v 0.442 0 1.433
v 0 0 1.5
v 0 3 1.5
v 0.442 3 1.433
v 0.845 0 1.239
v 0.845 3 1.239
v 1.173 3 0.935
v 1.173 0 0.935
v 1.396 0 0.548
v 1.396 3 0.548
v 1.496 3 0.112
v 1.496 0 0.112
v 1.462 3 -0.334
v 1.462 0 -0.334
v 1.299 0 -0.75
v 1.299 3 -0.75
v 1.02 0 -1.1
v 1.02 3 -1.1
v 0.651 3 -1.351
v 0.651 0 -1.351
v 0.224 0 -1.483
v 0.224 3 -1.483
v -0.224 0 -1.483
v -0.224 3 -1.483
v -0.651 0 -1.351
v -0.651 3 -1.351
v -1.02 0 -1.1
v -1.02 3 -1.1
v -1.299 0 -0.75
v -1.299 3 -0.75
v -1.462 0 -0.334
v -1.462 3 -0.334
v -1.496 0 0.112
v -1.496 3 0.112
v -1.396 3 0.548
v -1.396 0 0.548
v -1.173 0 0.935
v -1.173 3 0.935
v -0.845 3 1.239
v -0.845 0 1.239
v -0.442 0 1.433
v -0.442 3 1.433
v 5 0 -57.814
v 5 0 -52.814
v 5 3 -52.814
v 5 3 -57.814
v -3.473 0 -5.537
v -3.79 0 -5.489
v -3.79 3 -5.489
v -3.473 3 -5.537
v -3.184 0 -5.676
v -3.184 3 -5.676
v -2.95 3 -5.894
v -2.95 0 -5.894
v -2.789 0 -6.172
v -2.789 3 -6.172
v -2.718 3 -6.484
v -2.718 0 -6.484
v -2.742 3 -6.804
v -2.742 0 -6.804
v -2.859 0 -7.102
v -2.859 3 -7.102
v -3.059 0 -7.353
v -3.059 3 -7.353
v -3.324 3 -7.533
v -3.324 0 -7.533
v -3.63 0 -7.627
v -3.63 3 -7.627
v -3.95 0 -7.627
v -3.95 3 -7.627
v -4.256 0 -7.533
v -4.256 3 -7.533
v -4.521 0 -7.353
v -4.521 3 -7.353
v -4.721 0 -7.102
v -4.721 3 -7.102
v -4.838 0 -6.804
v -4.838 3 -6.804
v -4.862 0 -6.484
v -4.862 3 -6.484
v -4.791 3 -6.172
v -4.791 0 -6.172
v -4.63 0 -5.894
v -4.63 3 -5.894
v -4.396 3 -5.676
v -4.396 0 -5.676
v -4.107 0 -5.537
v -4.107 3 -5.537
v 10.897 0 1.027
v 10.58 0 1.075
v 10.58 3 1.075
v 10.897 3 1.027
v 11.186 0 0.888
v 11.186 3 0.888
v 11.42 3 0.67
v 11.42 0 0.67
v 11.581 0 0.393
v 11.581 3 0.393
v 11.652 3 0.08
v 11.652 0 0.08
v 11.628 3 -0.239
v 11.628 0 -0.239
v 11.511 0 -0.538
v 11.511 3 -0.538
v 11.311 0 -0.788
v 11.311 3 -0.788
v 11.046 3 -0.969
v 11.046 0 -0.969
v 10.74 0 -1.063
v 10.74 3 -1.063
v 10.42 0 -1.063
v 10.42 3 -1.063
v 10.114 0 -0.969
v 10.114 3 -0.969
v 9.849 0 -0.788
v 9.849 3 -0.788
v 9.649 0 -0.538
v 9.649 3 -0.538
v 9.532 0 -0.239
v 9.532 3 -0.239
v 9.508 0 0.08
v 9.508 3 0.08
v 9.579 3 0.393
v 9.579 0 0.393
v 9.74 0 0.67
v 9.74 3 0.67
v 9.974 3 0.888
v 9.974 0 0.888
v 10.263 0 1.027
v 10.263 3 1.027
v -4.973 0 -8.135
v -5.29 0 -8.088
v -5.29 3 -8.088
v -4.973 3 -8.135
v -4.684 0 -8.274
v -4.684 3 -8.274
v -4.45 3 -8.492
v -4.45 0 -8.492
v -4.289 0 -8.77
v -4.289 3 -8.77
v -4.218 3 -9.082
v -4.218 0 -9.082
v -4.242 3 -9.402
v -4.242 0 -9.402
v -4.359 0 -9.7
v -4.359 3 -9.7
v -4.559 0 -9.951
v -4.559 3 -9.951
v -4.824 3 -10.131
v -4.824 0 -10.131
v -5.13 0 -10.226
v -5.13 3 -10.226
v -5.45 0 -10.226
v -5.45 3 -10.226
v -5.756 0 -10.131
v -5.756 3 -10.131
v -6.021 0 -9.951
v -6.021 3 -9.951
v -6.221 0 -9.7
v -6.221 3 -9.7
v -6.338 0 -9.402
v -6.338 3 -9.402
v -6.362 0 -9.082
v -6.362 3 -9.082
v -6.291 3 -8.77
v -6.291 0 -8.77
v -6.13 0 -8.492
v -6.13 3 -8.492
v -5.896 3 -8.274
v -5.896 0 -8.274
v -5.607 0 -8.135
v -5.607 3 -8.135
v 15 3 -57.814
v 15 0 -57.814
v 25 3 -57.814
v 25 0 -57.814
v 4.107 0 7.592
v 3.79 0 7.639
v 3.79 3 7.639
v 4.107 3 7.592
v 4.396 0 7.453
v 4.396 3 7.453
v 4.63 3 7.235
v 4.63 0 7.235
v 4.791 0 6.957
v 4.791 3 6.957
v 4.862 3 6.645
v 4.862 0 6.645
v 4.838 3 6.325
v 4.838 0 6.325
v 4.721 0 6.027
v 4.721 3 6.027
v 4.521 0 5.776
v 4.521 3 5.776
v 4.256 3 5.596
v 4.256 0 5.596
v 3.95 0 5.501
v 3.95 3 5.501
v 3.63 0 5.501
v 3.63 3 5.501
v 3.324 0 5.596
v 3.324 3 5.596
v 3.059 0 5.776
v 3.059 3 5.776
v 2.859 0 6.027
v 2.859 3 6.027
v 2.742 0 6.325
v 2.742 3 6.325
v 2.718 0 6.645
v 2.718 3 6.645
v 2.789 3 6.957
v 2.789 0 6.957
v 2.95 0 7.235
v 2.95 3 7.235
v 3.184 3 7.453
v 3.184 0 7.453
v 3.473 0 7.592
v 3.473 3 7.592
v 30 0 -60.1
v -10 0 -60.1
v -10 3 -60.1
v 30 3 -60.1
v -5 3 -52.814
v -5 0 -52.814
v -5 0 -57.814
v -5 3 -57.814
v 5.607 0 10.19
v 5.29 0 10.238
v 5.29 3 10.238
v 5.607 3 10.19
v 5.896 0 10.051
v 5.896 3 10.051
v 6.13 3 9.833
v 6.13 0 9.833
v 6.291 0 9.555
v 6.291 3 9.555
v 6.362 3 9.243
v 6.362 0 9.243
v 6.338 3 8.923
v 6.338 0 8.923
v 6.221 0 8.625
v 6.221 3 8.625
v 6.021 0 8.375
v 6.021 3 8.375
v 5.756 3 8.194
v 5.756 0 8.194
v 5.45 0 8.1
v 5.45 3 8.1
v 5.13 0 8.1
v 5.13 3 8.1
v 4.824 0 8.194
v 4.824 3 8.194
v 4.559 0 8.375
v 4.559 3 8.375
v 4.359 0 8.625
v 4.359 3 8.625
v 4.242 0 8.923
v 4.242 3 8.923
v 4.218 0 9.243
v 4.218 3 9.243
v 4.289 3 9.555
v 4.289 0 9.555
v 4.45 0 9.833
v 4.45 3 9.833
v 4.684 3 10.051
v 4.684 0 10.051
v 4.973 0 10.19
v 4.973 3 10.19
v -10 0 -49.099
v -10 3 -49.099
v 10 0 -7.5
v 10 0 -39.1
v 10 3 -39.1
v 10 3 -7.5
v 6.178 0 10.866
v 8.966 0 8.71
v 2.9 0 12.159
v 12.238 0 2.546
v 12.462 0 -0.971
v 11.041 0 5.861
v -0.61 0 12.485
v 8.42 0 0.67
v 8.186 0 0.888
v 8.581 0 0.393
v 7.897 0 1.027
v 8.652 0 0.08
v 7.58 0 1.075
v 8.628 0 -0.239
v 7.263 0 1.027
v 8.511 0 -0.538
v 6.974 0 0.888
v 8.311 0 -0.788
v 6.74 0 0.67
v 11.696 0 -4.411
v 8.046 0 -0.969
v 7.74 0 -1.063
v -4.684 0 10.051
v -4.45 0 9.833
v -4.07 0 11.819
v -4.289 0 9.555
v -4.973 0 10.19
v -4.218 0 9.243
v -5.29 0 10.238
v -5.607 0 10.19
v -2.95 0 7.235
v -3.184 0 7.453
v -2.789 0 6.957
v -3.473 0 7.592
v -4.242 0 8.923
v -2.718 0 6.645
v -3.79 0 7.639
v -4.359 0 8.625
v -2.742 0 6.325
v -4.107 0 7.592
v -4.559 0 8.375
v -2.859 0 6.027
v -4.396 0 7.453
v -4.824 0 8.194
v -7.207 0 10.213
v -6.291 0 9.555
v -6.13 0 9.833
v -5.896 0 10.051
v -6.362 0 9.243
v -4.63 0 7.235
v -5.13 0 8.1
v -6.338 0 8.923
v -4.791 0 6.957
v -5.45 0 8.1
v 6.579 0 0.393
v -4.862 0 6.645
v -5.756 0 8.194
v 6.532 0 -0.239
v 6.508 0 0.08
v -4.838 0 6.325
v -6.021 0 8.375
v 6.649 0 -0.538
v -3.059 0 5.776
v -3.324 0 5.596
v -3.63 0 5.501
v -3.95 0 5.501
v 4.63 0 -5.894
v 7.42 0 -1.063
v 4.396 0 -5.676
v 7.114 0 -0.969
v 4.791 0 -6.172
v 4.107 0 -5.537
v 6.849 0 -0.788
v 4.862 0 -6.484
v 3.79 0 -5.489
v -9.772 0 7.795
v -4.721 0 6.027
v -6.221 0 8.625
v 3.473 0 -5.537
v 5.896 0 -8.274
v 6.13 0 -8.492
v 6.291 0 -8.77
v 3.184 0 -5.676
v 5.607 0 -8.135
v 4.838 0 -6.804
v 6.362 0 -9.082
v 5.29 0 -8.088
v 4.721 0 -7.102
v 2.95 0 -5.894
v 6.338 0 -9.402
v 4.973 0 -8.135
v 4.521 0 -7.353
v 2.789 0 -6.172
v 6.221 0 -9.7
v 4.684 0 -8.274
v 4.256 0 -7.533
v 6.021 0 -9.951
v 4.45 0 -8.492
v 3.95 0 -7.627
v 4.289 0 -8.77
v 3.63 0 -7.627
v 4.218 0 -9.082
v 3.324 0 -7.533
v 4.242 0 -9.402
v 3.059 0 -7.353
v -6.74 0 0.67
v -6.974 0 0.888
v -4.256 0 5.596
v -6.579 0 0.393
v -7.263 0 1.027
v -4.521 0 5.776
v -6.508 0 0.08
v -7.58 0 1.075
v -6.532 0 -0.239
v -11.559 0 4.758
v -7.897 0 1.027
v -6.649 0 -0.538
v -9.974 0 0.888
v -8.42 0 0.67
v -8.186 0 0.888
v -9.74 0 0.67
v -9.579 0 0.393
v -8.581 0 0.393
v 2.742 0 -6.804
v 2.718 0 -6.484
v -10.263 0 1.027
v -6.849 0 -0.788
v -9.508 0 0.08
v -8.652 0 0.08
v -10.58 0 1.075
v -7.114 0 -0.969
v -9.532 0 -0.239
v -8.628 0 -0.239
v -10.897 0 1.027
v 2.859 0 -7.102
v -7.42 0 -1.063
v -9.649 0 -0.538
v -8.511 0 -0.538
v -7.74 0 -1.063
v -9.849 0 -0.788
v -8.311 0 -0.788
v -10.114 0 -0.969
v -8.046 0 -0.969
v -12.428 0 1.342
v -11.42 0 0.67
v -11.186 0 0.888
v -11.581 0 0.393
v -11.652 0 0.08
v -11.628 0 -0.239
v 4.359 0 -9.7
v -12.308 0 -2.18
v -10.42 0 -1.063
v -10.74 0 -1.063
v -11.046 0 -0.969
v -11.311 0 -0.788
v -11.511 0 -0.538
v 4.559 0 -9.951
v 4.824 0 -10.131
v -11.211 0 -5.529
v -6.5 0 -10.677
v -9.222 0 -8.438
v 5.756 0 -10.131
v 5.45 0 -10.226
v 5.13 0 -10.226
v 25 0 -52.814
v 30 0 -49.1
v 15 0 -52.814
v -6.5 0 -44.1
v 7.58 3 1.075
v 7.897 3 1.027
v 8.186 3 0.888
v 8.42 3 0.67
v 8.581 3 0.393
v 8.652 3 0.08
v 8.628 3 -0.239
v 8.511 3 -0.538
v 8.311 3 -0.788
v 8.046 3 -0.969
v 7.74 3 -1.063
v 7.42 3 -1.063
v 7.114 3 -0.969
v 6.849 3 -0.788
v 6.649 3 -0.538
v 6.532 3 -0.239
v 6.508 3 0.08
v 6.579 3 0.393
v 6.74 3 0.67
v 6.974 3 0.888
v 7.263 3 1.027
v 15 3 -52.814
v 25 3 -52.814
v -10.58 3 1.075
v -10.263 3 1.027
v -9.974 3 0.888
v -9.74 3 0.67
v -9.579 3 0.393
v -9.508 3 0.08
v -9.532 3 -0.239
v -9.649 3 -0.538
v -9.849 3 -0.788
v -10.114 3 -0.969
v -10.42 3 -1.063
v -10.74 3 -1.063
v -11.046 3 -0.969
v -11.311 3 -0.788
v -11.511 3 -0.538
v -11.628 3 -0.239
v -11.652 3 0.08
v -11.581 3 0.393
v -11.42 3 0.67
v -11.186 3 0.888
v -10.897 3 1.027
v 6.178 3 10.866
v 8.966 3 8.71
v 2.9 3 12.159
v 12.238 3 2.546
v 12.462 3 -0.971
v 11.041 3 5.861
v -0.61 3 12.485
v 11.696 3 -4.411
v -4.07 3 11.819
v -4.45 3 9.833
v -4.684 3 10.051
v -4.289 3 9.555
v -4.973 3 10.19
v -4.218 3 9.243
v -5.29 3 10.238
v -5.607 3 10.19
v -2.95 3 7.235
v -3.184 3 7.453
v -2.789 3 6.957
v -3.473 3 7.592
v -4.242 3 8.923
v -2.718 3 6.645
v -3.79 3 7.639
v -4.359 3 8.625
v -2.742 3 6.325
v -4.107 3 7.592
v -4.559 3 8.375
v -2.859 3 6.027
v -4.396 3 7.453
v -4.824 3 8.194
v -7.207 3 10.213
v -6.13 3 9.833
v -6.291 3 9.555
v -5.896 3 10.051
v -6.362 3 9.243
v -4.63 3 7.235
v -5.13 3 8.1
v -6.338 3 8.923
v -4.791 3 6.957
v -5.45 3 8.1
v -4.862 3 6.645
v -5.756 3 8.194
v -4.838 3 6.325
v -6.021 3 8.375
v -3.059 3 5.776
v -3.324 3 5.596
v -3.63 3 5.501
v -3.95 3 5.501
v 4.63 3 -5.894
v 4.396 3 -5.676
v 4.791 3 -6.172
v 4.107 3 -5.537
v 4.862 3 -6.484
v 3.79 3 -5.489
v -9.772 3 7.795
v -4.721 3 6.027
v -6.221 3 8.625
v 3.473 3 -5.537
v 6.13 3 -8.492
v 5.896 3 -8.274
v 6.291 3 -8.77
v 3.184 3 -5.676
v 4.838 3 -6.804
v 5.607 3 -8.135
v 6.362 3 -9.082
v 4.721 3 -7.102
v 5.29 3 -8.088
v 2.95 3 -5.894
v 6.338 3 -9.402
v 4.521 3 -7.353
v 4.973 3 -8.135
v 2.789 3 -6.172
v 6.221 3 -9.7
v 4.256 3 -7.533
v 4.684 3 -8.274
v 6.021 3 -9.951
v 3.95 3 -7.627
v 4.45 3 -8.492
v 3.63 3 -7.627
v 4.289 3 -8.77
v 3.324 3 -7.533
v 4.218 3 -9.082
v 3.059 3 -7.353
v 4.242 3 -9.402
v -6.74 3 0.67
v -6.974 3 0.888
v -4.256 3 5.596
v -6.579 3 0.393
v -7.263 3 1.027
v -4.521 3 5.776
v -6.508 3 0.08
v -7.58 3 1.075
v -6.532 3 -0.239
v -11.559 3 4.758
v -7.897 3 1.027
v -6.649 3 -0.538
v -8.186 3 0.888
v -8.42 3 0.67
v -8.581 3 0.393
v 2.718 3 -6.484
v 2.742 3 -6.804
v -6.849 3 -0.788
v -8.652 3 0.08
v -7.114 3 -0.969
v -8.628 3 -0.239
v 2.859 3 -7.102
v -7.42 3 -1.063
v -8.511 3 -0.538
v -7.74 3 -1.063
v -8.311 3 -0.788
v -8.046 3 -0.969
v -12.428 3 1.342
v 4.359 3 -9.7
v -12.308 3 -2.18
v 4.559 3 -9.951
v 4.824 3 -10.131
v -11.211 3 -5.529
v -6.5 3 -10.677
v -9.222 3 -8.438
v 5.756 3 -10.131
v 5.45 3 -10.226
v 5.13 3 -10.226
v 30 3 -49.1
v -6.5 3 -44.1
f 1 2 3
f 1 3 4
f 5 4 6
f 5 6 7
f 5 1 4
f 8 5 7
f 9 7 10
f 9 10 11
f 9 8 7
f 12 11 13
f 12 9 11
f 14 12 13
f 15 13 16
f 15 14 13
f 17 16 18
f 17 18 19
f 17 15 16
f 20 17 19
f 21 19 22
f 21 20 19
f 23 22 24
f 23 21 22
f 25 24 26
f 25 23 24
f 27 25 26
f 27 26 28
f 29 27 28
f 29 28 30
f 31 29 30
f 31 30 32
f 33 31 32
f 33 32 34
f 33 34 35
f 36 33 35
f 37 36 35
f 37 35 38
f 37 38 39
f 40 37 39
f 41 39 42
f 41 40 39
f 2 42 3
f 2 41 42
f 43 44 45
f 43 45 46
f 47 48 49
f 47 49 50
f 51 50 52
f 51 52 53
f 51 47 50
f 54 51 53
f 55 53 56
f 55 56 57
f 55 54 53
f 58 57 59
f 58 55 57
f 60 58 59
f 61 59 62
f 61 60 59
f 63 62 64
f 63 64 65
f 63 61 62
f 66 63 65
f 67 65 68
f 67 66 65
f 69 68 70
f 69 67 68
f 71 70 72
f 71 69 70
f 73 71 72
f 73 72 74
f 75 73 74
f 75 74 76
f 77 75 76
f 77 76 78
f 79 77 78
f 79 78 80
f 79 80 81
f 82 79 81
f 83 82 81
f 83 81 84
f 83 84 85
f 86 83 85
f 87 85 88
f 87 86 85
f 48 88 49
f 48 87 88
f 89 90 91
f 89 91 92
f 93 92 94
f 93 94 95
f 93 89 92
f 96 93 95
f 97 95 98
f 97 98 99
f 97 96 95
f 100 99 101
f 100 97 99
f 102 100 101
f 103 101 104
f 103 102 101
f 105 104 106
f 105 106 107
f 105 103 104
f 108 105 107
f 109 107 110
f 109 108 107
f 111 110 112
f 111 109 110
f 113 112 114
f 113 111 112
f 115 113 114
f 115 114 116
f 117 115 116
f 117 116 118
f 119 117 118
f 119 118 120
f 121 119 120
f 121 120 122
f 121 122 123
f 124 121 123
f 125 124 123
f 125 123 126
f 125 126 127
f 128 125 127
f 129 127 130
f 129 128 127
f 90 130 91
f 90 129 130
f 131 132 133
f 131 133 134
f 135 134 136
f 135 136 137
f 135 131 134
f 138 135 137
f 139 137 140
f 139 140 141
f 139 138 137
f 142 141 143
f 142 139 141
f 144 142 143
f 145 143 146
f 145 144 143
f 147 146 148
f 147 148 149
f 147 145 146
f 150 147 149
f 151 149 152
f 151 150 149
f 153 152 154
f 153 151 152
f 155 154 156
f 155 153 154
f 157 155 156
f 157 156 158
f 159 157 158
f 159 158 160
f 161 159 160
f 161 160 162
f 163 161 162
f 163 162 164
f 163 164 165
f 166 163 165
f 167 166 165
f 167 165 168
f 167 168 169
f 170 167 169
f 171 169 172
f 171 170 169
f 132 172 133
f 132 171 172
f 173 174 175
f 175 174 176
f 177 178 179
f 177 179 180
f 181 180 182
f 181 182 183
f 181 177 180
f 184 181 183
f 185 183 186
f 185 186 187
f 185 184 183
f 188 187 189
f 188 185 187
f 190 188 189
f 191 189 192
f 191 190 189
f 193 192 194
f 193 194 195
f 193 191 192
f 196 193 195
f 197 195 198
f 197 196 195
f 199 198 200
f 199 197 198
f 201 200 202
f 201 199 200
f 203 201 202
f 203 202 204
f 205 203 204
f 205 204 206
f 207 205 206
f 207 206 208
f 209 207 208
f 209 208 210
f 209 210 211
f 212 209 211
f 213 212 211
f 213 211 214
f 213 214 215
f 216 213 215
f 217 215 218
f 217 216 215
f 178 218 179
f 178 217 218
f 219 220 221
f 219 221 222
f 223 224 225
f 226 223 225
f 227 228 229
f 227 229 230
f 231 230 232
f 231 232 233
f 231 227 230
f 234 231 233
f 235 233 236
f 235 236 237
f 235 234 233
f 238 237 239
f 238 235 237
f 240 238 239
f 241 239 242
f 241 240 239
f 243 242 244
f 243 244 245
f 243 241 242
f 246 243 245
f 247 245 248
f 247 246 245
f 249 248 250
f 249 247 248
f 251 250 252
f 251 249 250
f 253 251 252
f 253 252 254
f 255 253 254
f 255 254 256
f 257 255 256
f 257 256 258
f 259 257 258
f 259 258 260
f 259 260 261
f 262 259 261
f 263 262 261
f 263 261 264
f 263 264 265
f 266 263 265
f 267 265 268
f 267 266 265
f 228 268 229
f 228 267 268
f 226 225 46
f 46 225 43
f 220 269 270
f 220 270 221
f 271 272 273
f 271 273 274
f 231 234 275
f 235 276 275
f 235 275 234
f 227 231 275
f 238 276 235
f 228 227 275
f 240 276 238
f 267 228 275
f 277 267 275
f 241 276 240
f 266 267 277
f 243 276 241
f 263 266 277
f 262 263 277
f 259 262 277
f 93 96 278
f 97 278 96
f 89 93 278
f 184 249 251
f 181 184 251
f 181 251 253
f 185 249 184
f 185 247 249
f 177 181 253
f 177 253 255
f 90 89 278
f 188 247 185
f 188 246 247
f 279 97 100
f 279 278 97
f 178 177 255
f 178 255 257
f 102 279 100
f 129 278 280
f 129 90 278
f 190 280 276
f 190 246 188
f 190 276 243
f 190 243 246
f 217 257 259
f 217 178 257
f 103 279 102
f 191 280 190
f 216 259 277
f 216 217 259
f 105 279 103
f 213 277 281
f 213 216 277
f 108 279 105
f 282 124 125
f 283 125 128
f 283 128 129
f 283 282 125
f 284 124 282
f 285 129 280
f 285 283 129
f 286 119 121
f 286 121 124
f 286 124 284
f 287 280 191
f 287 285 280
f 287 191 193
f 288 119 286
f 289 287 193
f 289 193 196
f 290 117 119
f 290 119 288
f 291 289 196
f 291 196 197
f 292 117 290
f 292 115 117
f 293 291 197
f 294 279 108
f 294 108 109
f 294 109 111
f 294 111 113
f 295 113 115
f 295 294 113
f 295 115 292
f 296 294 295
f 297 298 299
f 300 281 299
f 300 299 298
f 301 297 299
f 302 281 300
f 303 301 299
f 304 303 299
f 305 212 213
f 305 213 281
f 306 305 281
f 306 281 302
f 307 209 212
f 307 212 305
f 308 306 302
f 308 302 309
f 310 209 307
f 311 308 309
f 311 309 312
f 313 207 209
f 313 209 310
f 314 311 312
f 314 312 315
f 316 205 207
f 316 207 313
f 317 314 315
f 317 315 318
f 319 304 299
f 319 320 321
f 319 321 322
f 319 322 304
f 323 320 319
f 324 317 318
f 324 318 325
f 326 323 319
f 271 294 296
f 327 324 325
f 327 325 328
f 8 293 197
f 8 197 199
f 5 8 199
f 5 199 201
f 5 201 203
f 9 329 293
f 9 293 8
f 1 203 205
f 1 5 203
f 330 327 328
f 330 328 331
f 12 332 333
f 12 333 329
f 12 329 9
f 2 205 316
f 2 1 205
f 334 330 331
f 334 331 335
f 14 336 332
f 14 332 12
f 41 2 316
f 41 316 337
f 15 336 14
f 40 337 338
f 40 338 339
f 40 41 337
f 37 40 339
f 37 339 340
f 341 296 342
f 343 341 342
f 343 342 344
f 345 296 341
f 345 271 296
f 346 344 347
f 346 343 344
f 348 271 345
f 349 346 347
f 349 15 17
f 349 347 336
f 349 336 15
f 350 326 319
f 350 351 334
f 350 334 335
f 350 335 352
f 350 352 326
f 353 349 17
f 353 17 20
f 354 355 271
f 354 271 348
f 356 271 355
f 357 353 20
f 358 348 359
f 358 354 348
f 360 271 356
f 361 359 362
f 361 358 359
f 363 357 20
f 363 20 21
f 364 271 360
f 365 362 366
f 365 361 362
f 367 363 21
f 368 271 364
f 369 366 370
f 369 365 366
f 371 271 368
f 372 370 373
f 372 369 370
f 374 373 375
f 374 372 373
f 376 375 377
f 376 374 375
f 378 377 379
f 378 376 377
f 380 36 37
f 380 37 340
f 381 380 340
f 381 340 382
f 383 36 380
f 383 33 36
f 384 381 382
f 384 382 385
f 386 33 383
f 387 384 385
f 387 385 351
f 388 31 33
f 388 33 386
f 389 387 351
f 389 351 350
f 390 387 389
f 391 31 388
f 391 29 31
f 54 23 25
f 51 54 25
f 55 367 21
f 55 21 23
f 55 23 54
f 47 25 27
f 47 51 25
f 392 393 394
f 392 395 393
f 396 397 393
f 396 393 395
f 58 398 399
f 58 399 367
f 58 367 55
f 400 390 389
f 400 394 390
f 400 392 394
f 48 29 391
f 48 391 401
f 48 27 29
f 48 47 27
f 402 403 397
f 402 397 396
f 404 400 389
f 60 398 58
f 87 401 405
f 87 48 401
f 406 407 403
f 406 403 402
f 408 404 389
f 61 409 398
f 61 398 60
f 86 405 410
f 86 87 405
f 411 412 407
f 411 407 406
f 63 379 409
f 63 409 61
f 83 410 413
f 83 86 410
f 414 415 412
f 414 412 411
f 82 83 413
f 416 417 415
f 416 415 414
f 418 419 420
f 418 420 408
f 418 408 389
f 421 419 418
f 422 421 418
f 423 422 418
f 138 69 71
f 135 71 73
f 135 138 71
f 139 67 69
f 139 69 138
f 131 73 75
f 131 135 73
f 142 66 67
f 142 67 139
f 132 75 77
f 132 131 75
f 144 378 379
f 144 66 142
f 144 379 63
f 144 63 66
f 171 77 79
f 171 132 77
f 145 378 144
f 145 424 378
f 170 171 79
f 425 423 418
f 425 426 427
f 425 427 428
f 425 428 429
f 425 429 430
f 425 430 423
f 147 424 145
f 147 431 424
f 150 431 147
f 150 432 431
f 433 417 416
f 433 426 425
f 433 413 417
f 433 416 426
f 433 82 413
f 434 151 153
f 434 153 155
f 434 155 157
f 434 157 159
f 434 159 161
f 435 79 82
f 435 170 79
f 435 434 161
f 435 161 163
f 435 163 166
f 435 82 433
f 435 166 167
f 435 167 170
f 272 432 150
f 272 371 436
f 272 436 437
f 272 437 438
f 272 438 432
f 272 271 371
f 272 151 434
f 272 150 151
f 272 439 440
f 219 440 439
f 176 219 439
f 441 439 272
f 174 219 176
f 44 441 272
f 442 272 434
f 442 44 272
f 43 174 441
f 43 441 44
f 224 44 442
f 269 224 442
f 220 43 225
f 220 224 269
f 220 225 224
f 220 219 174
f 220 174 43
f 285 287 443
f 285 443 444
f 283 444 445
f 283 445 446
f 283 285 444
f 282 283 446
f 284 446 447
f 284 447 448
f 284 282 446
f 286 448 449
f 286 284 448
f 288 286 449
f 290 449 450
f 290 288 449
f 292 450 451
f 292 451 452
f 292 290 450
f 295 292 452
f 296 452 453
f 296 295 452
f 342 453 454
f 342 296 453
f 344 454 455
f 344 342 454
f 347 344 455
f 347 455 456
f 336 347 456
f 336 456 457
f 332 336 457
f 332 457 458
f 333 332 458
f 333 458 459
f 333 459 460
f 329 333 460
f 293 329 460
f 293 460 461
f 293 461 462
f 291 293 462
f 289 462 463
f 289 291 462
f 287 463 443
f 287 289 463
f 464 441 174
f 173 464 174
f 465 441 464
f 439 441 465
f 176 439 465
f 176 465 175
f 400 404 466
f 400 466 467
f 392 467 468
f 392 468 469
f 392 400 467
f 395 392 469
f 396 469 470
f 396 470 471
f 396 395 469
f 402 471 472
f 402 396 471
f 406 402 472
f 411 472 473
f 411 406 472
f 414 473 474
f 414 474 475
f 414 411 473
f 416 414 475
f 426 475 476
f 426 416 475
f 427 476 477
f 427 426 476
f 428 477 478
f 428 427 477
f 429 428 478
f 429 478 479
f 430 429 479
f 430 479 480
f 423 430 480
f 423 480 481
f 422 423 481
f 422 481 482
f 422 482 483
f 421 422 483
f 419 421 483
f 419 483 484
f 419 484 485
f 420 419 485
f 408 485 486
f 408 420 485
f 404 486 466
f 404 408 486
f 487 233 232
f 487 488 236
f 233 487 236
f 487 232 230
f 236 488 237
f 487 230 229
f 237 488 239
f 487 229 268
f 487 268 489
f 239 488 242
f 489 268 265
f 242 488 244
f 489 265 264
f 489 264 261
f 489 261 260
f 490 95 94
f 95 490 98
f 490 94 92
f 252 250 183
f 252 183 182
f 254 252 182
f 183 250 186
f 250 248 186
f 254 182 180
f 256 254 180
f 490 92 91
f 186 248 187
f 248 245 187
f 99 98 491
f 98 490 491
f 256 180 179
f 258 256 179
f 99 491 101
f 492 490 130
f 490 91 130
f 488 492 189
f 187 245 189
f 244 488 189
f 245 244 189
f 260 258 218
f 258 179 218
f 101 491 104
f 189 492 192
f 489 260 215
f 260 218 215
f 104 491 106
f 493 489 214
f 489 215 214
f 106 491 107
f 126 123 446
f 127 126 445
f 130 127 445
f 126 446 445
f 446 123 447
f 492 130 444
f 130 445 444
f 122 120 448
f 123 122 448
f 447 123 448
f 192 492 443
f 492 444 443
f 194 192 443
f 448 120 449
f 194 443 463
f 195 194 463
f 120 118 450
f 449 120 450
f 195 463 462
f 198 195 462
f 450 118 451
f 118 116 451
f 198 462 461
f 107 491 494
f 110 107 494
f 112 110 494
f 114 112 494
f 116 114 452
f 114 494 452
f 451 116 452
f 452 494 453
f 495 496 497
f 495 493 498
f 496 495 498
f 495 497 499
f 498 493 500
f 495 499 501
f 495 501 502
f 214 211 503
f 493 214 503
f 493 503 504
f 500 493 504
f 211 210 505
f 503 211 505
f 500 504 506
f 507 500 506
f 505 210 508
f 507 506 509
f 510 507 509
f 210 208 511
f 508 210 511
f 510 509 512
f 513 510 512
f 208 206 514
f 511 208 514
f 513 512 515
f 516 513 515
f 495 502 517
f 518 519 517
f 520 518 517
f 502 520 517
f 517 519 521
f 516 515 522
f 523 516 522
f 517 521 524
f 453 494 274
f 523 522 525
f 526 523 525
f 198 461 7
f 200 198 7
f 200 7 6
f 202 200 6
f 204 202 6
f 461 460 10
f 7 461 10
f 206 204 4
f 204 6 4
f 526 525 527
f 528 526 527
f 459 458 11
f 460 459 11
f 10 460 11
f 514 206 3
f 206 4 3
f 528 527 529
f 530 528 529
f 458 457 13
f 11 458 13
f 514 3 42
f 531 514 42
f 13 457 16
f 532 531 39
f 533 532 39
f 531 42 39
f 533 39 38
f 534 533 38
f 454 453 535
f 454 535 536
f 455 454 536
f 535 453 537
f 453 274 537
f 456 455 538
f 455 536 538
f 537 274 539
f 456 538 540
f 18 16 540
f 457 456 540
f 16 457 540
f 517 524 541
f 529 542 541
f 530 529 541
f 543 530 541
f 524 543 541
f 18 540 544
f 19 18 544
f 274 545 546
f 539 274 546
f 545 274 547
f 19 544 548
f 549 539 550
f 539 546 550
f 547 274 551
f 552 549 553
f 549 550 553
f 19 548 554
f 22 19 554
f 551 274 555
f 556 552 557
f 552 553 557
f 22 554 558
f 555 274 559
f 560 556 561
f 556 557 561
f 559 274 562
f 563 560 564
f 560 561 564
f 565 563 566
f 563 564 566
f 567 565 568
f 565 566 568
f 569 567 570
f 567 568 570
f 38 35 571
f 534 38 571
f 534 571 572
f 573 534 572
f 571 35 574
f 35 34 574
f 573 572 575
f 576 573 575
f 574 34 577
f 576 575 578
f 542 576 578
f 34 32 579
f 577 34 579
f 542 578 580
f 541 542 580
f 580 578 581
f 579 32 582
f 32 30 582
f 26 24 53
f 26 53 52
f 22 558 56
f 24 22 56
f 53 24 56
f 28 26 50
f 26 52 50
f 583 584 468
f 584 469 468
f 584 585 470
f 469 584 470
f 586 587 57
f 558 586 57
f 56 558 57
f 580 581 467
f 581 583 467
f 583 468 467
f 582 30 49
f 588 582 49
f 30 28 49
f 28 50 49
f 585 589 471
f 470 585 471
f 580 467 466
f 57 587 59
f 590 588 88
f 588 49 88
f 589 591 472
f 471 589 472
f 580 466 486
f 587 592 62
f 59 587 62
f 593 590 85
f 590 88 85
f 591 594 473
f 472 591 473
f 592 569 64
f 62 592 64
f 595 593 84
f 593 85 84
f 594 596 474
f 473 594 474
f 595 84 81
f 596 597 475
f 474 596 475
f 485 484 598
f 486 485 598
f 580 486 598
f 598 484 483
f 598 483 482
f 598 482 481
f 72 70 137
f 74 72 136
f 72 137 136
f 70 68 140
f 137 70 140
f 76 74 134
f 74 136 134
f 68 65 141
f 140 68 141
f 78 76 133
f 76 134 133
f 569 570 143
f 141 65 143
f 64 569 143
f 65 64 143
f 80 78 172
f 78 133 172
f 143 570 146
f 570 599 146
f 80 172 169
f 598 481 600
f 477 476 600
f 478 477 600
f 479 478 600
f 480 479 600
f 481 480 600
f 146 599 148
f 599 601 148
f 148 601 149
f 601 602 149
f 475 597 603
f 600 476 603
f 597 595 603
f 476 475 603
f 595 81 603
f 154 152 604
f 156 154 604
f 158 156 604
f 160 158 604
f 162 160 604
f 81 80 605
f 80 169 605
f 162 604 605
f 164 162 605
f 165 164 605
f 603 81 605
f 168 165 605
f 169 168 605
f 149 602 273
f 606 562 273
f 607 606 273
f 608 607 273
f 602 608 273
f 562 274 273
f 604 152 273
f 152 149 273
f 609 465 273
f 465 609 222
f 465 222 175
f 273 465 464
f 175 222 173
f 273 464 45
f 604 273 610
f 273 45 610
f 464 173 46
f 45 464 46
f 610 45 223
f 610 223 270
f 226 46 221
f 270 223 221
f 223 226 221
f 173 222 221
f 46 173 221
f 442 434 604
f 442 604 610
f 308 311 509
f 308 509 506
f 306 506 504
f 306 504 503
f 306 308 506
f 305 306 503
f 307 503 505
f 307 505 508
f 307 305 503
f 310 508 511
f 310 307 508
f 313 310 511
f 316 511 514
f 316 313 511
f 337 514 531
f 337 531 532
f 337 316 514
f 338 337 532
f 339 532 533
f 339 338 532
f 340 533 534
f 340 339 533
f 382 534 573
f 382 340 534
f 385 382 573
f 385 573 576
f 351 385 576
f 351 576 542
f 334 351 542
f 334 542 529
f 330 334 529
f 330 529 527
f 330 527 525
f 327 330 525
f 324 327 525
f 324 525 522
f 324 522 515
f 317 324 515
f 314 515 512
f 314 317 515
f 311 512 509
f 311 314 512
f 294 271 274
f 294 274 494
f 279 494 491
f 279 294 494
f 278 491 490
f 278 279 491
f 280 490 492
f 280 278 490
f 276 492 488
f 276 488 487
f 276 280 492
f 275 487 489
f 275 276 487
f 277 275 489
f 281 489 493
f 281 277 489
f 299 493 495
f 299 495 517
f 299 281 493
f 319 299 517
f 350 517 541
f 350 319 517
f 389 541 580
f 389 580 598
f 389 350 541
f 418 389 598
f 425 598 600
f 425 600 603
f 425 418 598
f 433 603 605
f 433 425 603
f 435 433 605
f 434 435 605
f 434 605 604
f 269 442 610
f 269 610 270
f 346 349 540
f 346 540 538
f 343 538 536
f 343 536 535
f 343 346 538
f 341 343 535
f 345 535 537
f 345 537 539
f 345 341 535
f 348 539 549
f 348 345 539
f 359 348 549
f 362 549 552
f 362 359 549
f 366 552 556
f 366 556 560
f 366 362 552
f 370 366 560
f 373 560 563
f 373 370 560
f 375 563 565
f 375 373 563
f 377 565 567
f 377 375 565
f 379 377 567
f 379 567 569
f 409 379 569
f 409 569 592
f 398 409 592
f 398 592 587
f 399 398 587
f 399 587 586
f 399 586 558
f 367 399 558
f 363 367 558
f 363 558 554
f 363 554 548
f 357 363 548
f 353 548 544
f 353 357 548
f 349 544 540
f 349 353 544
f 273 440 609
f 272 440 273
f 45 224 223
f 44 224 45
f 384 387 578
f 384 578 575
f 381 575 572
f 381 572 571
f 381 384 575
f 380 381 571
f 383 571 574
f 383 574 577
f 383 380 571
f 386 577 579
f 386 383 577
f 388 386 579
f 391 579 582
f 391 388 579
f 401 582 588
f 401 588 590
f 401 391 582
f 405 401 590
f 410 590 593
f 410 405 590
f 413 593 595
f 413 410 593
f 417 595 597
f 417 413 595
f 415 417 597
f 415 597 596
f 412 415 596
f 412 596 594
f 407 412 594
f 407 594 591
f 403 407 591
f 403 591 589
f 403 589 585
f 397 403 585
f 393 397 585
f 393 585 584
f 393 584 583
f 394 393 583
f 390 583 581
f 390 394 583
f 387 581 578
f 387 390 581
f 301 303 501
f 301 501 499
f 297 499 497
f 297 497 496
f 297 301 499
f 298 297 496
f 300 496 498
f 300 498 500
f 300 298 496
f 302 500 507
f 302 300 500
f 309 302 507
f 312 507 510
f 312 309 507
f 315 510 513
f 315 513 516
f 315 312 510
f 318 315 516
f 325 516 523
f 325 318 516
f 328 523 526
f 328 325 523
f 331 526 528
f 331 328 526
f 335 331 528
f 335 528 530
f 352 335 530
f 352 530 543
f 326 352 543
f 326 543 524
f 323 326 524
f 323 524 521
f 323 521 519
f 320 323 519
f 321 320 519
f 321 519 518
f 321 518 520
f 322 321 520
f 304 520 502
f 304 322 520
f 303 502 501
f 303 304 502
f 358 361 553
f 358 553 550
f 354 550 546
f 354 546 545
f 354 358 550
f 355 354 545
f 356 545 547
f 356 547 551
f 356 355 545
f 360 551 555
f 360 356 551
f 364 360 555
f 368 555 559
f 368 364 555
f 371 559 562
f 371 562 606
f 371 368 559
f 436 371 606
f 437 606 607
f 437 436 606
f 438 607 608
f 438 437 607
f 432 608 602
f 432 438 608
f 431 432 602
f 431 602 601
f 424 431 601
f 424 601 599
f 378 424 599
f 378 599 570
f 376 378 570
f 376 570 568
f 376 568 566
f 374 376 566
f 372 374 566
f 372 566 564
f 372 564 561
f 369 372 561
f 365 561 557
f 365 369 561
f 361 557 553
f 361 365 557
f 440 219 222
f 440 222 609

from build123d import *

# Parameters (mm, degrees)
SKETCH_1_R      = 1.075
SKETCH_1_R_2    = 1.5
SKETCH_1_W      = 10
SKETCH_1_H      = 5
EXTRUDE_2_DEPTH = 3


with BuildPart() as part:
    # 草图1 → 凸台-拉伸2 (new body)
    with BuildSketch(Plane(origin=(0, 0, 0), x_dir=(1, 0, 0), z_dir=(0, 1, 0))):
        with BuildLine():
            Line((-6.5, 10.677078252), (-6.5, 44.1))
            Line((-6.5, 44.1), (-10, 49.098518024))
            Line((-10, 49.098518024), (-10, 60.1))
            Line((-10, 60.1), (30, 60.1))
            Line((30, 60.1), (30, 49.1))
            Line((30, 49.1), (10, 39.1))
            Line((10, 39.1), (10, 7.5))
            ThreePointArc((10, 7.5), (-2.363462831, -12.274528237), (-6.5, 10.677078252))
        make_face()
        with Locations(Location((7.58, 0, 0), (0, 0, 270))):
            Circle(SKETCH_1_R, mode=Mode.SUBTRACT)
        with Locations(Location((10.58, 0, 0), (0, 0, 270))):
            Circle(SKETCH_1_R, mode=Mode.SUBTRACT)
        with Locations(Location((3.79, -6.564472561, 0), (0, 0, 270))):
            Circle(SKETCH_1_R, mode=Mode.SUBTRACT)
        with Locations(Location((5.29, -9.162548772, 0), (0, 0, 270))):
            Circle(SKETCH_1_R, mode=Mode.SUBTRACT)
        with Locations(Location((-3.79, -6.564472561, 0), (0, 0, 270))):
            Circle(SKETCH_1_R, mode=Mode.SUBTRACT)
        with Locations(Location((-5.29, -9.162548772, 0), (0, 0, 270))):
            Circle(SKETCH_1_R, mode=Mode.SUBTRACT)
        with Locations(Location((-7.58, 0, 0), (0, 0, 270))):
            Circle(SKETCH_1_R, mode=Mode.SUBTRACT)
        with Locations(Location((-10.58, 0, 0), (0, 0, 270))):
            Circle(SKETCH_1_R, mode=Mode.SUBTRACT)
        with Locations(Location((-3.79, 6.564472561, 0), (0, 0, 270))):
            Circle(SKETCH_1_R, mode=Mode.SUBTRACT)
        with Locations(Location((-5.29, 9.162548772, 0), (0, 0, 270))):
            Circle(SKETCH_1_R, mode=Mode.SUBTRACT)
        with Locations(Location((3.79, 6.564472561, 0), (0, 0, 270))):
            Circle(SKETCH_1_R, mode=Mode.SUBTRACT)
        with Locations(Location((5.29, 9.162548772, 0), (0, 0, 270))):
            Circle(SKETCH_1_R, mode=Mode.SUBTRACT)
        with Locations(Location((0, 0, 0), (0, 0, 270))):
            Circle(SKETCH_1_R_2, mode=Mode.SUBTRACT)
        with Locations((0, 55.314192659)):
            Rectangle(SKETCH_1_W, SKETCH_1_H, mode=Mode.SUBTRACT)
        with Locations((20, 55.314192659)):
            Rectangle(SKETCH_1_W, SKETCH_1_H, mode=Mode.SUBTRACT)
    extrude(amount=EXTRUDE_2_DEPTH)


solid = part.part
